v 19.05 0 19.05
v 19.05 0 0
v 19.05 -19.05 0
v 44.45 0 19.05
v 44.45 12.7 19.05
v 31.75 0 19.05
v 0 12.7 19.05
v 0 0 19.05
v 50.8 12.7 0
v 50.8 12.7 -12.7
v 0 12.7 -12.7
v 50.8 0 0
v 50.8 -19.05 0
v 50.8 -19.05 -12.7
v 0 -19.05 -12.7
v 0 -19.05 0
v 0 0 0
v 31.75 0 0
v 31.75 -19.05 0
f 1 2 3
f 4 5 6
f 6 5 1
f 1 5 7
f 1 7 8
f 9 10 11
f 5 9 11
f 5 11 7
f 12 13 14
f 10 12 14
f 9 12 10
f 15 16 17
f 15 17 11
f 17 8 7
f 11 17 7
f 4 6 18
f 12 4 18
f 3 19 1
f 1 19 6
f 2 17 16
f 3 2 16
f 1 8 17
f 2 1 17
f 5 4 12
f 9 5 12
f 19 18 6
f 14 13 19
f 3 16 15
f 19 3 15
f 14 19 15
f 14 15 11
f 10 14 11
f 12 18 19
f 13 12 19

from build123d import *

# Parameters (mm, degrees)
F1_DEPTH = 50.8
F3_DEPTH = 25.4
F4_W     = 12.7
F4_H     = 19.05
F5_DEPTH = 19.05
F7_DEPTH = 25.4


with BuildPart() as f1:
    # F0 (on Right) → F1 (new body)
    with BuildSketch(Plane.YZ):
        Polygon((0, 19.05), (0, 0), (-19.05, 0), (-19.05, -12.7), (12.7, -12.7), (12.7, 19.05), align=None)
    extrude(amount=F1_DEPTH)

    # F2 (on face) → F3 (cut)
    with BuildSketch(Plane.XZ):
        Polygon((50.8, 0), (50.8, 19.05), (44.45, 19.05), align=None)
    extrude(amount=-F3_DEPTH, mode=Mode.SUBTRACT)

    # F4 (on face) → F5 (join)
    with BuildSketch(Plane.XZ):
        with Locations((25.4, 9.525)):
            Rectangle(F4_W, F4_H)
    extrude(amount=F5_DEPTH)

    # F6 (on face) → F7 (cut)
    with BuildSketch(Plane.YZ.offset(31.75)):
        Polygon((-19.05, 19.05), (-19.05, 0), (0, 19.05), align=None)
    extrude(amount=-F7_DEPTH, mode=Mode.SUBTRACT)


solid = f1.part
